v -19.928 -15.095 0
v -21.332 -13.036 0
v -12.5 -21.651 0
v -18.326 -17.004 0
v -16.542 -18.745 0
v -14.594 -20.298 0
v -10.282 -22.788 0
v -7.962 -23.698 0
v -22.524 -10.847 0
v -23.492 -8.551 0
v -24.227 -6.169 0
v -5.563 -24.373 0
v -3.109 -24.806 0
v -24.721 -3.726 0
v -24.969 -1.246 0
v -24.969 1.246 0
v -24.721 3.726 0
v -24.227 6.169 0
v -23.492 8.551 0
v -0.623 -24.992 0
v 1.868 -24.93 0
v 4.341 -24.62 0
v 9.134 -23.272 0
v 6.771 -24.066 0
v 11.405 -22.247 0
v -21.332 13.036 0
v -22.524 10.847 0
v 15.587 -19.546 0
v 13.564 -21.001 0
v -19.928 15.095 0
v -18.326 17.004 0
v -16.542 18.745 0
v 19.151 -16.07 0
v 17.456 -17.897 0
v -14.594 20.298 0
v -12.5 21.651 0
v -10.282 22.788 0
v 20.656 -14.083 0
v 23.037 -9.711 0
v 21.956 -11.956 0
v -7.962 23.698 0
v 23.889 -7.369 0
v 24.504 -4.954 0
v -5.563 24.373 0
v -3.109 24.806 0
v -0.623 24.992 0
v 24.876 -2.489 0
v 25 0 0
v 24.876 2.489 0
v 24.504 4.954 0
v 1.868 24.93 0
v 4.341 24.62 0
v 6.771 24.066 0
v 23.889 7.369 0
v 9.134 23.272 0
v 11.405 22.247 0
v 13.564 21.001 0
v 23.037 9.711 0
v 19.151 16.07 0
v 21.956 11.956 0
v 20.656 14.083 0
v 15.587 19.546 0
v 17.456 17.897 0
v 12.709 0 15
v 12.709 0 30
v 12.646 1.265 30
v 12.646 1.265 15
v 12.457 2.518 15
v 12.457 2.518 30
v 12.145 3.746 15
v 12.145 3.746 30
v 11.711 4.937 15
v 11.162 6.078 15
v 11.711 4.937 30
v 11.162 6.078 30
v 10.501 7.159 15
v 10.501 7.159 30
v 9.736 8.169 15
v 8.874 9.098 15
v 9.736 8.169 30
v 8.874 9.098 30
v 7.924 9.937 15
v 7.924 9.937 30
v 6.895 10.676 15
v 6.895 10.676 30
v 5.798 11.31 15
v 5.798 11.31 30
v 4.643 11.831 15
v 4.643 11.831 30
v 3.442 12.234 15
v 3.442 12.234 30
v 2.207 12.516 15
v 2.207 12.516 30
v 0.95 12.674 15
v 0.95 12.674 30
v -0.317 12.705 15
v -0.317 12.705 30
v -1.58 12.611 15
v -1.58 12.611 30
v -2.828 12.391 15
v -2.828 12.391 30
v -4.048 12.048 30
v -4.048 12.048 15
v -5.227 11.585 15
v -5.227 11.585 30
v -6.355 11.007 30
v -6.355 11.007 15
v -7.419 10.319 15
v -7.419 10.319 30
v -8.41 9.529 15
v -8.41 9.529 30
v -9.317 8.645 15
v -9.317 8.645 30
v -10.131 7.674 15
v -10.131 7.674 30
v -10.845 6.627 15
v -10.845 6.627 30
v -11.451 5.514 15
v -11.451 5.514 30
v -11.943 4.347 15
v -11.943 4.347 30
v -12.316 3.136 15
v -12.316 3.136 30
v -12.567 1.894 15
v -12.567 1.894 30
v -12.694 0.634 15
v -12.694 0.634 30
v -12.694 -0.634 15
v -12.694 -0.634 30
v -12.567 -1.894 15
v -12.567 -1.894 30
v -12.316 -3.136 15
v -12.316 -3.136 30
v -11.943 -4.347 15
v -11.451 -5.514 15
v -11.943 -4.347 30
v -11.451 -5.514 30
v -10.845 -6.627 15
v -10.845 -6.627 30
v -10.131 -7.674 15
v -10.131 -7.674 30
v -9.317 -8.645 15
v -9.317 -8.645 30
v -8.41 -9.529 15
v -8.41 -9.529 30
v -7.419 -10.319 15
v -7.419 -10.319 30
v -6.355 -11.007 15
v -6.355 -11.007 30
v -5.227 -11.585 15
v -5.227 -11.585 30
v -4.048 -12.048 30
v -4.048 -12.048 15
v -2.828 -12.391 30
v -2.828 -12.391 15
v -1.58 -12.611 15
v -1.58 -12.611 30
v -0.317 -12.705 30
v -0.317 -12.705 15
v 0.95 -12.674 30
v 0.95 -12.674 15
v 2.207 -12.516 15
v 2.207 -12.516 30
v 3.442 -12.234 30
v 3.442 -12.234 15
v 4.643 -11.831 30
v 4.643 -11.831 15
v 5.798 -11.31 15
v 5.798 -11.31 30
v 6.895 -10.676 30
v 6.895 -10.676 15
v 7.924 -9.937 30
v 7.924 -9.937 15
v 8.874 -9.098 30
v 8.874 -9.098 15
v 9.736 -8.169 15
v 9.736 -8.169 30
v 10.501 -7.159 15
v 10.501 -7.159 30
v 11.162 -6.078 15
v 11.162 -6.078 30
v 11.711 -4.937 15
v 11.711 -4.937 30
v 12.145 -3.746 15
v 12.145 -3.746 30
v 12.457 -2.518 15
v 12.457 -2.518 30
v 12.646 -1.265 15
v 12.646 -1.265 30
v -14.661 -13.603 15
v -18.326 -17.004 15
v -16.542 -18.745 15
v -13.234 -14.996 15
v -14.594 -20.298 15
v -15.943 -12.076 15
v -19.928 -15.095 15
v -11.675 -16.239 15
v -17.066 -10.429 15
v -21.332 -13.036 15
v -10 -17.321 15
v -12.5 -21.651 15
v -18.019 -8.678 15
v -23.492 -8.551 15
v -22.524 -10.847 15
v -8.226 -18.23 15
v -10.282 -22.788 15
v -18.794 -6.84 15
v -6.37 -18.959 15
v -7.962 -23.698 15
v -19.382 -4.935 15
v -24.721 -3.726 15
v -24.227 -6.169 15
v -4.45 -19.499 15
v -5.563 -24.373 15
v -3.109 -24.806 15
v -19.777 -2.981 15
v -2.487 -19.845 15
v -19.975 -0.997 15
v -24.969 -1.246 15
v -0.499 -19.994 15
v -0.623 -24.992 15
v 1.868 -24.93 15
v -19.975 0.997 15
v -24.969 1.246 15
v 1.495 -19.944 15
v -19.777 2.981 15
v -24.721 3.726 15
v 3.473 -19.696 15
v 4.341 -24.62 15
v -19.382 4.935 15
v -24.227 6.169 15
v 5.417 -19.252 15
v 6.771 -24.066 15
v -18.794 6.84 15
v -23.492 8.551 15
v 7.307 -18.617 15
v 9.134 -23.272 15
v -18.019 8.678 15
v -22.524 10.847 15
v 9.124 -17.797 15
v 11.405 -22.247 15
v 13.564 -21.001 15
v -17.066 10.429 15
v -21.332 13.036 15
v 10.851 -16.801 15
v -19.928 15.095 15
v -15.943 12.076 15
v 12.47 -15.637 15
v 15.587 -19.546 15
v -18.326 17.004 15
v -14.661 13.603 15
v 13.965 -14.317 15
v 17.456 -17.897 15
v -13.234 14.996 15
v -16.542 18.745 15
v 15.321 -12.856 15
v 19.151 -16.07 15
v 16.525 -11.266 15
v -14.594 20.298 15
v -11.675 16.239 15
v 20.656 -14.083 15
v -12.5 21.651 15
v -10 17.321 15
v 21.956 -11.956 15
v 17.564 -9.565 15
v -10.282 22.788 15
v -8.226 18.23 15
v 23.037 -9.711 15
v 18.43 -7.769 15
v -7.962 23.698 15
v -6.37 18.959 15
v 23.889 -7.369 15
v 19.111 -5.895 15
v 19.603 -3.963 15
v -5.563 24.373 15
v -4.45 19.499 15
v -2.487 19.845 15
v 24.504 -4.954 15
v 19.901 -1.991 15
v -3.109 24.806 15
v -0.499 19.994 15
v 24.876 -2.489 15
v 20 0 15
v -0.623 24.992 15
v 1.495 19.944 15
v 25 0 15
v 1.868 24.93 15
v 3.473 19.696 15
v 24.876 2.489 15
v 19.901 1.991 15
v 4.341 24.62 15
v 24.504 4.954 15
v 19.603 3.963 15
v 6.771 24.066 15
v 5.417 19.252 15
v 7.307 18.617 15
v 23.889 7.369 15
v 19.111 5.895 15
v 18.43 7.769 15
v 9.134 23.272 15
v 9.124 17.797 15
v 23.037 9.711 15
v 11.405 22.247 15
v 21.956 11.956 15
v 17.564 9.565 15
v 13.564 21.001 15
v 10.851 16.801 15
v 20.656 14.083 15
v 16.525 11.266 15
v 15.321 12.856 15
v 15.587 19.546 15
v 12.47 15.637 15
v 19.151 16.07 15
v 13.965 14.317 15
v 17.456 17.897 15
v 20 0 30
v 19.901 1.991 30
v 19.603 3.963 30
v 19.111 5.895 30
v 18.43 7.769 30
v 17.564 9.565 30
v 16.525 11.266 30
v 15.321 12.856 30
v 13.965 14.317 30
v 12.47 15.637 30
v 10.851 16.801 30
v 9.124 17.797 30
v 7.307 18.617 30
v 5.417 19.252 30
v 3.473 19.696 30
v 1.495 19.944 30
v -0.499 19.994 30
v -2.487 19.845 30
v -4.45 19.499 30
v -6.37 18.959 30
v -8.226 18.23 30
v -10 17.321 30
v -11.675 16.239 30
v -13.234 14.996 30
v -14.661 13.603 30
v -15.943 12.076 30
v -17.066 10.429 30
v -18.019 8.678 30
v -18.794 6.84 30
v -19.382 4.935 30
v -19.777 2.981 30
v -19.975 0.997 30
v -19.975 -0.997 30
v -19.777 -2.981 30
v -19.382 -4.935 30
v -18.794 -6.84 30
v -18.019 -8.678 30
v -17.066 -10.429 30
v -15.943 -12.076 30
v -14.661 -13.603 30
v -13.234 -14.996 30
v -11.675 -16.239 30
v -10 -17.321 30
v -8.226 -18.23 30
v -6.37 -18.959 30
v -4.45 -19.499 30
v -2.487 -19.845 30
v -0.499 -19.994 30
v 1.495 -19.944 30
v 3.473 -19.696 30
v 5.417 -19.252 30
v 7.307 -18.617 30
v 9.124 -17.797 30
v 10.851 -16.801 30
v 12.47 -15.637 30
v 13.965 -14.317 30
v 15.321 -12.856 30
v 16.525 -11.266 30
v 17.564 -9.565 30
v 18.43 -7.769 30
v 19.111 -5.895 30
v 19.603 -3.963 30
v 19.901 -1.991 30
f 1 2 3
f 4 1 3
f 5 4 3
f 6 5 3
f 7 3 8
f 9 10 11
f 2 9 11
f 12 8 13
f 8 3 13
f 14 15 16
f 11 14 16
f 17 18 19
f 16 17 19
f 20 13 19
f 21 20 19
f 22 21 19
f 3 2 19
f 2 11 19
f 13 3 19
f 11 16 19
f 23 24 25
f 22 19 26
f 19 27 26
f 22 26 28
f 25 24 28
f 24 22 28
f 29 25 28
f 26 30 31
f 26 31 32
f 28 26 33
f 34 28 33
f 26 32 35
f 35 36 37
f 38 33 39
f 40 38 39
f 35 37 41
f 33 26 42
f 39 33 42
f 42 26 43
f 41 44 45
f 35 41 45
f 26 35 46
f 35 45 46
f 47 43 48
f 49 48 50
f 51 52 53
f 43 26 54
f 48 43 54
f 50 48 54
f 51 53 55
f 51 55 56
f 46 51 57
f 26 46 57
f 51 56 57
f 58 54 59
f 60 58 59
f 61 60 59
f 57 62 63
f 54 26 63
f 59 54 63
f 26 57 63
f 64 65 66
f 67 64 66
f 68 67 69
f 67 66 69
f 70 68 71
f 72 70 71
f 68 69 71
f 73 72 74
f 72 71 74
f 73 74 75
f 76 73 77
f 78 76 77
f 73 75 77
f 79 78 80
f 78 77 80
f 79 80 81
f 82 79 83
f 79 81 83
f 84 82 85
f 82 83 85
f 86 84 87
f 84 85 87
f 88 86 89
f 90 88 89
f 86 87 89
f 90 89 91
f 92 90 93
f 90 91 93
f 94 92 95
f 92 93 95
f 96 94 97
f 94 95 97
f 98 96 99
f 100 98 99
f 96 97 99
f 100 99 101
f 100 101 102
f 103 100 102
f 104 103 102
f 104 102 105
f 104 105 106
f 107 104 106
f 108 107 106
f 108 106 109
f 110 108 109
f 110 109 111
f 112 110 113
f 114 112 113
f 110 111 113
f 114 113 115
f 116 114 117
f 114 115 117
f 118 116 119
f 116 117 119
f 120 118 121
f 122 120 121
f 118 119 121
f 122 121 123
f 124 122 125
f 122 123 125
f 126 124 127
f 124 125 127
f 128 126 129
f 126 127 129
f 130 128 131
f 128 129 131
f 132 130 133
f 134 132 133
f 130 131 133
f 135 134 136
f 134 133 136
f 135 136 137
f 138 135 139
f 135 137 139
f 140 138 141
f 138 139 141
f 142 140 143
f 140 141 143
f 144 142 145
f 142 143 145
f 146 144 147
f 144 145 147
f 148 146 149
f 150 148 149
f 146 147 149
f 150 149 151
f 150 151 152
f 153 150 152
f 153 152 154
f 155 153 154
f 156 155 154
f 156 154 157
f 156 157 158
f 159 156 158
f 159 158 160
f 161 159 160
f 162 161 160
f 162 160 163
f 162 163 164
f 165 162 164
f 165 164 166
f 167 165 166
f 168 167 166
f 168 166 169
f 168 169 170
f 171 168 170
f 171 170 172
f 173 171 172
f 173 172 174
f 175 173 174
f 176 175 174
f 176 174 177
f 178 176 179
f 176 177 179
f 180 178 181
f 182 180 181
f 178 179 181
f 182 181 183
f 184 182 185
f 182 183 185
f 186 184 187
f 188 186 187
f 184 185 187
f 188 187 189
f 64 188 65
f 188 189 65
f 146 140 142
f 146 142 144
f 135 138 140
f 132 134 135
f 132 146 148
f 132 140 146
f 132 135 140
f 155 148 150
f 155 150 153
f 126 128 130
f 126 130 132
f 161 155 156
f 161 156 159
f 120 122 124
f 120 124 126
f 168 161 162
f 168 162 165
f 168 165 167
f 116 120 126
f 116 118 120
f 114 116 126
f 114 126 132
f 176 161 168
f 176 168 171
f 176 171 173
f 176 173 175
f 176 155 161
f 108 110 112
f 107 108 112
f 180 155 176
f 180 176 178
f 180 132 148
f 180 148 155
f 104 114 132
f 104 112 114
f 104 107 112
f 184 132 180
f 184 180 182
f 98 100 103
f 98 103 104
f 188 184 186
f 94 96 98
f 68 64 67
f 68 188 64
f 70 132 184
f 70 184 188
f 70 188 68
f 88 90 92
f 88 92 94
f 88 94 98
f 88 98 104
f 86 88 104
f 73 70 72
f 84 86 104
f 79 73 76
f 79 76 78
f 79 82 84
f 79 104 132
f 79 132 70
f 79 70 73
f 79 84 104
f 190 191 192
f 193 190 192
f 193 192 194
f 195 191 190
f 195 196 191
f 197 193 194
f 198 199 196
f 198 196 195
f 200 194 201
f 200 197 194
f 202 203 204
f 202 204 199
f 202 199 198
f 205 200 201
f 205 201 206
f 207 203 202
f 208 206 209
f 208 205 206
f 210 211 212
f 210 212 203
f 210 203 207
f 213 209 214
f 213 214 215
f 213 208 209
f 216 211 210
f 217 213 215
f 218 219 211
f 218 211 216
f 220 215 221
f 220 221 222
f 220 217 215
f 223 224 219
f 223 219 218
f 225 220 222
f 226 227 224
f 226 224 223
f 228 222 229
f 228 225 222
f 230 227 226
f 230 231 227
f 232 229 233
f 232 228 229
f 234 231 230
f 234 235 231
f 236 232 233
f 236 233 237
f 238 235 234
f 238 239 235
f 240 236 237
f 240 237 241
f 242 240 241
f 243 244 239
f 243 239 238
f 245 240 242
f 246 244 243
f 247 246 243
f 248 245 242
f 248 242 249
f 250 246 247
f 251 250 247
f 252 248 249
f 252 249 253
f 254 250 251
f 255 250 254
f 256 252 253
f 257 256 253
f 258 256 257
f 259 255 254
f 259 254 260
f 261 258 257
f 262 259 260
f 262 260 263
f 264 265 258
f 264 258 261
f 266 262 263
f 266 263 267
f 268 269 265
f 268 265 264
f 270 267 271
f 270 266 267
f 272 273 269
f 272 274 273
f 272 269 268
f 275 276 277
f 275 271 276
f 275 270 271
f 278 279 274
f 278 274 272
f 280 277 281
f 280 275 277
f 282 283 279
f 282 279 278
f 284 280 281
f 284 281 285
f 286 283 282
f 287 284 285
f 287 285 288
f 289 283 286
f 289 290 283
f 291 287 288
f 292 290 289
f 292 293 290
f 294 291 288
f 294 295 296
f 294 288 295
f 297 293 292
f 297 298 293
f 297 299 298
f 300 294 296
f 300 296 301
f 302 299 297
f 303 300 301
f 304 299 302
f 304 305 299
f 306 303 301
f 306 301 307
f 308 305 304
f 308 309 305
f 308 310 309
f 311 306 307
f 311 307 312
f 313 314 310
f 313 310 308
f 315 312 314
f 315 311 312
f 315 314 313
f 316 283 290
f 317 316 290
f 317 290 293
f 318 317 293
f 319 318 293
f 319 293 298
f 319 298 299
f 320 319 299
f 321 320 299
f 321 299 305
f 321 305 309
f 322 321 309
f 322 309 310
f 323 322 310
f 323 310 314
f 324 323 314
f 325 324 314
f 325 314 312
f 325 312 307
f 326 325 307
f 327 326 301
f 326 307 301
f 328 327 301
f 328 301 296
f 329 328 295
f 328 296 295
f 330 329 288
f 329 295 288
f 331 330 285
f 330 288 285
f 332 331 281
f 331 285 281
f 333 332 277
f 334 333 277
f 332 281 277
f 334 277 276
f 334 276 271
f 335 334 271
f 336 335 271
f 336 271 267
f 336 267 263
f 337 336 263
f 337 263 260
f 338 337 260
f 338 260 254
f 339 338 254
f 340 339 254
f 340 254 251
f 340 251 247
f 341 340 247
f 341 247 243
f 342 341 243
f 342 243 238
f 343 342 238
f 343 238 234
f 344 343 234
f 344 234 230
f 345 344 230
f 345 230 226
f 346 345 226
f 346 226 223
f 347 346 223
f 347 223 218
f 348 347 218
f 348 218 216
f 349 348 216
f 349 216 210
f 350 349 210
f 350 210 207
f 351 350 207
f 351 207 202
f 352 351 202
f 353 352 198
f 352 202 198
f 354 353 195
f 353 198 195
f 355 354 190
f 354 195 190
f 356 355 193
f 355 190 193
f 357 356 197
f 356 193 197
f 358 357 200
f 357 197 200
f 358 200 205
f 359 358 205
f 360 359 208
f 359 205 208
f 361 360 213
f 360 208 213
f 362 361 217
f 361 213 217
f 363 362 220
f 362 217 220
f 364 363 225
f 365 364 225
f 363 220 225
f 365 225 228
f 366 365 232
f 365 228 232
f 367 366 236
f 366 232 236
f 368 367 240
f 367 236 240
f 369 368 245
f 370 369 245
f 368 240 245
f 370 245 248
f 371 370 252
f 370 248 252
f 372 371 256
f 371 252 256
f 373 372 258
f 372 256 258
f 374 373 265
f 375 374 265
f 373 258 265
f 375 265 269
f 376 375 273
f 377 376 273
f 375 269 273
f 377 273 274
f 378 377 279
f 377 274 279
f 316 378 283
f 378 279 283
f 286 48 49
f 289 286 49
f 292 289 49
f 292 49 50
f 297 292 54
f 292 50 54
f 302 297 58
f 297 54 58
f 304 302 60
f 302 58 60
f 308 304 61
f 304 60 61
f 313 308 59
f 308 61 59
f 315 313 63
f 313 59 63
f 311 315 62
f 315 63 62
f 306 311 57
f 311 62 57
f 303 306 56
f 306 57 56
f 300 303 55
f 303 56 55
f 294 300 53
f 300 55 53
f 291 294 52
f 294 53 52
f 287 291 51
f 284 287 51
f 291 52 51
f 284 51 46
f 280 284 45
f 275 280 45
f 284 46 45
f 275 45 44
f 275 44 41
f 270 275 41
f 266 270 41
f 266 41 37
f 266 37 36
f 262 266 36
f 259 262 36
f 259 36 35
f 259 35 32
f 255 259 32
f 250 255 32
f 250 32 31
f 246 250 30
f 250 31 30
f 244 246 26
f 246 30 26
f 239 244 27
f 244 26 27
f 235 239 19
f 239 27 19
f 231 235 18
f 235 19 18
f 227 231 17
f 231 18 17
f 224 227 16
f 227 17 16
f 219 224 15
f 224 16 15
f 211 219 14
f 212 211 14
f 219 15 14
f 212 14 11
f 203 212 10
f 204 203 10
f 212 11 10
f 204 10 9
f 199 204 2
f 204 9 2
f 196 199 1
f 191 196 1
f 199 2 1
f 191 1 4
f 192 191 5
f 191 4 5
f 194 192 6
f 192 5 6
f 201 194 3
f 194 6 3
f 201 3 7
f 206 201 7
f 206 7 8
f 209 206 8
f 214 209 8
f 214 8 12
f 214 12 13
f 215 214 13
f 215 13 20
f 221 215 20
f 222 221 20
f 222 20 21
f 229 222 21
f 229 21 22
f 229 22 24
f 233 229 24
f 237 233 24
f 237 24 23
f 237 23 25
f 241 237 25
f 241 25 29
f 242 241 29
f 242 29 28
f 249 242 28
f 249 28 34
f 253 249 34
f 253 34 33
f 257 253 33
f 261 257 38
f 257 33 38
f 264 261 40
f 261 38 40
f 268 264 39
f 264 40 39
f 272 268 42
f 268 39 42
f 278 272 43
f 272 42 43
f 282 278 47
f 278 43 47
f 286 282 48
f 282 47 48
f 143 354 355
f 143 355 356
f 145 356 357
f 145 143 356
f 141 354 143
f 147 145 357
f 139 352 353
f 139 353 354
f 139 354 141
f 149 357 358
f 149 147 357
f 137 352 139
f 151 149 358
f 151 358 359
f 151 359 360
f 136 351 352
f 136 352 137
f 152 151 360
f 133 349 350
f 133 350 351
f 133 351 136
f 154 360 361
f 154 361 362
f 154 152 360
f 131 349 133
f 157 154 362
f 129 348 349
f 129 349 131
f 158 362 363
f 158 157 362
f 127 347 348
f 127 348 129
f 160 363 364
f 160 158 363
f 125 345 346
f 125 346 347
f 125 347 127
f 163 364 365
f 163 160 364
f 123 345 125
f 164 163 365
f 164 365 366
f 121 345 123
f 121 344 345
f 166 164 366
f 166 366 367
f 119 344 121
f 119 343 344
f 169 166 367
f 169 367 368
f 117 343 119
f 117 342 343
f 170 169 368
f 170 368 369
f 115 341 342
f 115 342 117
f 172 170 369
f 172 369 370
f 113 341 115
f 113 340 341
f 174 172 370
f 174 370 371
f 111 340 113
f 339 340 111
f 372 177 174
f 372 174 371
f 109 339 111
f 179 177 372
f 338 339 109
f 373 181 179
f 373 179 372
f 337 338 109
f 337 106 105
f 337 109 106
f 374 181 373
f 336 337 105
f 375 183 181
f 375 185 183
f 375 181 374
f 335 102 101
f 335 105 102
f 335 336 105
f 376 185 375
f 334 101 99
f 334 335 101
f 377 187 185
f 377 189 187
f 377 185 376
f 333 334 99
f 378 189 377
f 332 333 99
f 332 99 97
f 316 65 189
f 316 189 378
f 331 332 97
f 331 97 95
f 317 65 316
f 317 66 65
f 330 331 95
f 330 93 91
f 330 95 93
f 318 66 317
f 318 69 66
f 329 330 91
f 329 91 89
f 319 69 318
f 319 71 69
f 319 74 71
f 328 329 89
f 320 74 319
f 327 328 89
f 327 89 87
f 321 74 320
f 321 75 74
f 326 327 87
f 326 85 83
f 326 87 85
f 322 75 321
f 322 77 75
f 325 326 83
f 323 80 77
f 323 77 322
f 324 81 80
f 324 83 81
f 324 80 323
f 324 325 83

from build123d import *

# Parameters (mm, degrees)
F2_R     = 25
F2_R_2   = 20
F3_DEPTH = 15
F4_DEPTH = 30
F5_R     = 12.7094
F6_DEPTH = 15


with BuildPart() as f3:
    # F2 (on Top) → F3 (new body)
    with BuildSketch(Plane.XY):
        Circle(F2_R)
        Circle(F2_R_2, mode=Mode.SUBTRACT)
    extrude(amount=F3_DEPTH)

    # F2 (on Top) → F4 (join)
    with BuildSketch(Plane.XY):
        Circle(F2_R_2)
    extrude(amount=F4_DEPTH)

    # F5 (on face) → F6 (cut)
    with BuildSketch(Plane.XY.offset(30)):
        Circle(F5_R)
    extrude(amount=-F6_DEPTH, mode=Mode.SUBTRACT)


solid = f3.part
